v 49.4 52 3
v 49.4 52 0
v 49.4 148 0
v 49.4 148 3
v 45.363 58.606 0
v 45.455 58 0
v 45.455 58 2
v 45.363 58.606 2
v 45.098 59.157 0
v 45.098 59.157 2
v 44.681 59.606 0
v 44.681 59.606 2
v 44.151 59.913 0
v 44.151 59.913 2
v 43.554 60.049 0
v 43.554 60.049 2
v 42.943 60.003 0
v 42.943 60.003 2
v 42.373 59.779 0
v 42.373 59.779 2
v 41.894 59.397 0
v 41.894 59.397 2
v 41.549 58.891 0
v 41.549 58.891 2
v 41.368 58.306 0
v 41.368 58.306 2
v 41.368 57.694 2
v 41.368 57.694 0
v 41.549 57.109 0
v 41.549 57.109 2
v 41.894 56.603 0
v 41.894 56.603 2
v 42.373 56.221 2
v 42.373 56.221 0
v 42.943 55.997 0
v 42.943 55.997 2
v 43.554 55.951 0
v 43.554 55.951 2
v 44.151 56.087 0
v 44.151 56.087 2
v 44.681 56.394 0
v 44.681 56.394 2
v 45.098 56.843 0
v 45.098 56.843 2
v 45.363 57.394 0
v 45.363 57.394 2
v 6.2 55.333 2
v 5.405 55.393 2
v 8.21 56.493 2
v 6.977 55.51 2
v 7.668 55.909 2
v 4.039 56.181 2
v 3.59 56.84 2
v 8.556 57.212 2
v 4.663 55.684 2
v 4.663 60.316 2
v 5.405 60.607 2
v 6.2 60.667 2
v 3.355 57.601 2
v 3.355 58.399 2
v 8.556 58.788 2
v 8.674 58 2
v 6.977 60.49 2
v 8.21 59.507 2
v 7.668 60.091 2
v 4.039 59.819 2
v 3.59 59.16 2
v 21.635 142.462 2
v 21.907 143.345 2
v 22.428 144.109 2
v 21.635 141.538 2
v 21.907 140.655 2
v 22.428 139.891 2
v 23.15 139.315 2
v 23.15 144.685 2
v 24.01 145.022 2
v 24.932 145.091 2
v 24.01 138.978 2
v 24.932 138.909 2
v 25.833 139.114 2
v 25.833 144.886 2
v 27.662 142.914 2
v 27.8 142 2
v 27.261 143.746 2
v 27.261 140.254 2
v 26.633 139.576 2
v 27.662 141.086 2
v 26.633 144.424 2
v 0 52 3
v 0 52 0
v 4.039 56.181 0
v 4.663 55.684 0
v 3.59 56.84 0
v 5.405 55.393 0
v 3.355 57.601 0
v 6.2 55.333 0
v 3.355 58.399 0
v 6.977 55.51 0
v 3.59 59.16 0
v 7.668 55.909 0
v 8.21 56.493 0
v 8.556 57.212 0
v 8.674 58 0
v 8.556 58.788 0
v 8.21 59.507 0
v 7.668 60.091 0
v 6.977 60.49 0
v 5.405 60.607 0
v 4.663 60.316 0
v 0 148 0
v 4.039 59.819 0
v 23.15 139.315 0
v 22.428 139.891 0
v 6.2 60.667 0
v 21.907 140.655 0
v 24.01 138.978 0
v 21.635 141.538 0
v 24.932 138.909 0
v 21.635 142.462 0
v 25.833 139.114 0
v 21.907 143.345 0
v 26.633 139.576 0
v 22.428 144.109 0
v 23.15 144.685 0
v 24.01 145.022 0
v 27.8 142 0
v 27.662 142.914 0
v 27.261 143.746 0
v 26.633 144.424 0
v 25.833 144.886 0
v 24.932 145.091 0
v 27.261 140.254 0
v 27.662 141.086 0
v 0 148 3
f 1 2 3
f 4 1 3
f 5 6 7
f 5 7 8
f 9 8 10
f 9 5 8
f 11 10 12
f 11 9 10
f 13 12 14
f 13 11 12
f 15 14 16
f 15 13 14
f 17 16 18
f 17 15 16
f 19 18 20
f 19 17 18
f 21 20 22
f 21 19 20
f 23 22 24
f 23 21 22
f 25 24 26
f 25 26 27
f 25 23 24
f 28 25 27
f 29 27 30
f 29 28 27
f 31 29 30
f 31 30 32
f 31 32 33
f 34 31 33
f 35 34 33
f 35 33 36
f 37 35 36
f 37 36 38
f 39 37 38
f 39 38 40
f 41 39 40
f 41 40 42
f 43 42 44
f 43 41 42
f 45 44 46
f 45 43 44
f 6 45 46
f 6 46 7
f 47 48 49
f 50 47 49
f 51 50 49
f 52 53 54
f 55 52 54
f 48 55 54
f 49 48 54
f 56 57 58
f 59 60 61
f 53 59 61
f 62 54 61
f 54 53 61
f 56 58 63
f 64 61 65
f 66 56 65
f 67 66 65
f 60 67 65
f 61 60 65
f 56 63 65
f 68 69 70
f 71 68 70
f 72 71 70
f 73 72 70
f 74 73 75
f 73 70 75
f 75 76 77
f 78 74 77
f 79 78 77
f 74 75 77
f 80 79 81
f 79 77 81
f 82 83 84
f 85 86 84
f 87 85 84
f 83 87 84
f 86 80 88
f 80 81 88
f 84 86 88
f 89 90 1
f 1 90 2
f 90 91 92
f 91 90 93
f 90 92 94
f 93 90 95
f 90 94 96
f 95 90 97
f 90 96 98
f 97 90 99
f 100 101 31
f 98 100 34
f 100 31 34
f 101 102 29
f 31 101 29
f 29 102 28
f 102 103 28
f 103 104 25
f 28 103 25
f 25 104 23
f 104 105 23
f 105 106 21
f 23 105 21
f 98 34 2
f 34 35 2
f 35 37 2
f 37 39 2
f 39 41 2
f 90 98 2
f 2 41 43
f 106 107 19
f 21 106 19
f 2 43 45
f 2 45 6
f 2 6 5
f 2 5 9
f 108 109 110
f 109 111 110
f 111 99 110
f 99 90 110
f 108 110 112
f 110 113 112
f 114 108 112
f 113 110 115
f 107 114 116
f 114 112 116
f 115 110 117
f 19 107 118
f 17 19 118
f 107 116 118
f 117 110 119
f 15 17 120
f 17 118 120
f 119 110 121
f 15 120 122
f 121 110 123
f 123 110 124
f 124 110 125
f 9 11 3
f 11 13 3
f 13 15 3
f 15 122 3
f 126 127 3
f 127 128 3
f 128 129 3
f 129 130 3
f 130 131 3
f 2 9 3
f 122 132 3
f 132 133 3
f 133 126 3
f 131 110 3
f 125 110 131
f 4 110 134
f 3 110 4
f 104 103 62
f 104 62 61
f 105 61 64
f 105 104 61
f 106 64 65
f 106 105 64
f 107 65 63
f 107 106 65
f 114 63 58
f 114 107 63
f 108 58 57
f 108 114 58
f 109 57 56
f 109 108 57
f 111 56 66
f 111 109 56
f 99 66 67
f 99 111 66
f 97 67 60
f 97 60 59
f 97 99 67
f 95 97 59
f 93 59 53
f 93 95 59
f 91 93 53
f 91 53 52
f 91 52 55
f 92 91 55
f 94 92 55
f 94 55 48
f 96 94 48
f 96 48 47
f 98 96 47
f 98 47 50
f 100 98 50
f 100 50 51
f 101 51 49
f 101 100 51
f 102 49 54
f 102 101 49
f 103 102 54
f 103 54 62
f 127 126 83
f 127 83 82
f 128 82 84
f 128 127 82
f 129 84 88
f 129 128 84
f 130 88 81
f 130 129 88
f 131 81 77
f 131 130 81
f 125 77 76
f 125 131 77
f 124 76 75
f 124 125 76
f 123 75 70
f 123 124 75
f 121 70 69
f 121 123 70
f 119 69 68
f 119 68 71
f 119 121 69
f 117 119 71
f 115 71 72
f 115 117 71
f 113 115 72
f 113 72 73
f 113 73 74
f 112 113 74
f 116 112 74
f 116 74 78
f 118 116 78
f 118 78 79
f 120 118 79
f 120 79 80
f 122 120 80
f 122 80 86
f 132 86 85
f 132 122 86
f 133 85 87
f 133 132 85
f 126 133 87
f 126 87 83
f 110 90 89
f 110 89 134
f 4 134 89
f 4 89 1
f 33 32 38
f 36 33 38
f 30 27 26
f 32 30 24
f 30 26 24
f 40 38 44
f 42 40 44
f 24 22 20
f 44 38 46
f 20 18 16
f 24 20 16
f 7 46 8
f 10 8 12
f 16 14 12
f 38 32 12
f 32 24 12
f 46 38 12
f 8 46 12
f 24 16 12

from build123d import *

# Parameters (mm, degrees)
SKETCH_W      = 49.4
SKETCH_H      = 96
PAD_DEPTH     = 3
SKETCH001_R   = 3.1
SKETCH001_R_2 = 2.674465
SKETCH001_R_3 = 2.054582
POCKET_DEPTH  = 2


with BuildPart() as part:
    # Sketch → Pad (new body)
    with BuildSketch(Plane.XY):
        with Locations((24.7, 100)):
            Rectangle(SKETCH_W, SKETCH_H)
    extrude(amount=PAD_DEPTH)

    # Sketch001 → Pocket (cut)
    with BuildSketch(Plane.XY):
        with Locations((24.7, 142)):
            Circle(SKETCH001_R)
        with Locations((6, 58)):
            Circle(SKETCH001_R_2)
        with Locations((43.4, 58)):
            Circle(SKETCH001_R_3)
    extrude(amount=POCKET_DEPTH, mode=Mode.SUBTRACT)


solid = part.part
